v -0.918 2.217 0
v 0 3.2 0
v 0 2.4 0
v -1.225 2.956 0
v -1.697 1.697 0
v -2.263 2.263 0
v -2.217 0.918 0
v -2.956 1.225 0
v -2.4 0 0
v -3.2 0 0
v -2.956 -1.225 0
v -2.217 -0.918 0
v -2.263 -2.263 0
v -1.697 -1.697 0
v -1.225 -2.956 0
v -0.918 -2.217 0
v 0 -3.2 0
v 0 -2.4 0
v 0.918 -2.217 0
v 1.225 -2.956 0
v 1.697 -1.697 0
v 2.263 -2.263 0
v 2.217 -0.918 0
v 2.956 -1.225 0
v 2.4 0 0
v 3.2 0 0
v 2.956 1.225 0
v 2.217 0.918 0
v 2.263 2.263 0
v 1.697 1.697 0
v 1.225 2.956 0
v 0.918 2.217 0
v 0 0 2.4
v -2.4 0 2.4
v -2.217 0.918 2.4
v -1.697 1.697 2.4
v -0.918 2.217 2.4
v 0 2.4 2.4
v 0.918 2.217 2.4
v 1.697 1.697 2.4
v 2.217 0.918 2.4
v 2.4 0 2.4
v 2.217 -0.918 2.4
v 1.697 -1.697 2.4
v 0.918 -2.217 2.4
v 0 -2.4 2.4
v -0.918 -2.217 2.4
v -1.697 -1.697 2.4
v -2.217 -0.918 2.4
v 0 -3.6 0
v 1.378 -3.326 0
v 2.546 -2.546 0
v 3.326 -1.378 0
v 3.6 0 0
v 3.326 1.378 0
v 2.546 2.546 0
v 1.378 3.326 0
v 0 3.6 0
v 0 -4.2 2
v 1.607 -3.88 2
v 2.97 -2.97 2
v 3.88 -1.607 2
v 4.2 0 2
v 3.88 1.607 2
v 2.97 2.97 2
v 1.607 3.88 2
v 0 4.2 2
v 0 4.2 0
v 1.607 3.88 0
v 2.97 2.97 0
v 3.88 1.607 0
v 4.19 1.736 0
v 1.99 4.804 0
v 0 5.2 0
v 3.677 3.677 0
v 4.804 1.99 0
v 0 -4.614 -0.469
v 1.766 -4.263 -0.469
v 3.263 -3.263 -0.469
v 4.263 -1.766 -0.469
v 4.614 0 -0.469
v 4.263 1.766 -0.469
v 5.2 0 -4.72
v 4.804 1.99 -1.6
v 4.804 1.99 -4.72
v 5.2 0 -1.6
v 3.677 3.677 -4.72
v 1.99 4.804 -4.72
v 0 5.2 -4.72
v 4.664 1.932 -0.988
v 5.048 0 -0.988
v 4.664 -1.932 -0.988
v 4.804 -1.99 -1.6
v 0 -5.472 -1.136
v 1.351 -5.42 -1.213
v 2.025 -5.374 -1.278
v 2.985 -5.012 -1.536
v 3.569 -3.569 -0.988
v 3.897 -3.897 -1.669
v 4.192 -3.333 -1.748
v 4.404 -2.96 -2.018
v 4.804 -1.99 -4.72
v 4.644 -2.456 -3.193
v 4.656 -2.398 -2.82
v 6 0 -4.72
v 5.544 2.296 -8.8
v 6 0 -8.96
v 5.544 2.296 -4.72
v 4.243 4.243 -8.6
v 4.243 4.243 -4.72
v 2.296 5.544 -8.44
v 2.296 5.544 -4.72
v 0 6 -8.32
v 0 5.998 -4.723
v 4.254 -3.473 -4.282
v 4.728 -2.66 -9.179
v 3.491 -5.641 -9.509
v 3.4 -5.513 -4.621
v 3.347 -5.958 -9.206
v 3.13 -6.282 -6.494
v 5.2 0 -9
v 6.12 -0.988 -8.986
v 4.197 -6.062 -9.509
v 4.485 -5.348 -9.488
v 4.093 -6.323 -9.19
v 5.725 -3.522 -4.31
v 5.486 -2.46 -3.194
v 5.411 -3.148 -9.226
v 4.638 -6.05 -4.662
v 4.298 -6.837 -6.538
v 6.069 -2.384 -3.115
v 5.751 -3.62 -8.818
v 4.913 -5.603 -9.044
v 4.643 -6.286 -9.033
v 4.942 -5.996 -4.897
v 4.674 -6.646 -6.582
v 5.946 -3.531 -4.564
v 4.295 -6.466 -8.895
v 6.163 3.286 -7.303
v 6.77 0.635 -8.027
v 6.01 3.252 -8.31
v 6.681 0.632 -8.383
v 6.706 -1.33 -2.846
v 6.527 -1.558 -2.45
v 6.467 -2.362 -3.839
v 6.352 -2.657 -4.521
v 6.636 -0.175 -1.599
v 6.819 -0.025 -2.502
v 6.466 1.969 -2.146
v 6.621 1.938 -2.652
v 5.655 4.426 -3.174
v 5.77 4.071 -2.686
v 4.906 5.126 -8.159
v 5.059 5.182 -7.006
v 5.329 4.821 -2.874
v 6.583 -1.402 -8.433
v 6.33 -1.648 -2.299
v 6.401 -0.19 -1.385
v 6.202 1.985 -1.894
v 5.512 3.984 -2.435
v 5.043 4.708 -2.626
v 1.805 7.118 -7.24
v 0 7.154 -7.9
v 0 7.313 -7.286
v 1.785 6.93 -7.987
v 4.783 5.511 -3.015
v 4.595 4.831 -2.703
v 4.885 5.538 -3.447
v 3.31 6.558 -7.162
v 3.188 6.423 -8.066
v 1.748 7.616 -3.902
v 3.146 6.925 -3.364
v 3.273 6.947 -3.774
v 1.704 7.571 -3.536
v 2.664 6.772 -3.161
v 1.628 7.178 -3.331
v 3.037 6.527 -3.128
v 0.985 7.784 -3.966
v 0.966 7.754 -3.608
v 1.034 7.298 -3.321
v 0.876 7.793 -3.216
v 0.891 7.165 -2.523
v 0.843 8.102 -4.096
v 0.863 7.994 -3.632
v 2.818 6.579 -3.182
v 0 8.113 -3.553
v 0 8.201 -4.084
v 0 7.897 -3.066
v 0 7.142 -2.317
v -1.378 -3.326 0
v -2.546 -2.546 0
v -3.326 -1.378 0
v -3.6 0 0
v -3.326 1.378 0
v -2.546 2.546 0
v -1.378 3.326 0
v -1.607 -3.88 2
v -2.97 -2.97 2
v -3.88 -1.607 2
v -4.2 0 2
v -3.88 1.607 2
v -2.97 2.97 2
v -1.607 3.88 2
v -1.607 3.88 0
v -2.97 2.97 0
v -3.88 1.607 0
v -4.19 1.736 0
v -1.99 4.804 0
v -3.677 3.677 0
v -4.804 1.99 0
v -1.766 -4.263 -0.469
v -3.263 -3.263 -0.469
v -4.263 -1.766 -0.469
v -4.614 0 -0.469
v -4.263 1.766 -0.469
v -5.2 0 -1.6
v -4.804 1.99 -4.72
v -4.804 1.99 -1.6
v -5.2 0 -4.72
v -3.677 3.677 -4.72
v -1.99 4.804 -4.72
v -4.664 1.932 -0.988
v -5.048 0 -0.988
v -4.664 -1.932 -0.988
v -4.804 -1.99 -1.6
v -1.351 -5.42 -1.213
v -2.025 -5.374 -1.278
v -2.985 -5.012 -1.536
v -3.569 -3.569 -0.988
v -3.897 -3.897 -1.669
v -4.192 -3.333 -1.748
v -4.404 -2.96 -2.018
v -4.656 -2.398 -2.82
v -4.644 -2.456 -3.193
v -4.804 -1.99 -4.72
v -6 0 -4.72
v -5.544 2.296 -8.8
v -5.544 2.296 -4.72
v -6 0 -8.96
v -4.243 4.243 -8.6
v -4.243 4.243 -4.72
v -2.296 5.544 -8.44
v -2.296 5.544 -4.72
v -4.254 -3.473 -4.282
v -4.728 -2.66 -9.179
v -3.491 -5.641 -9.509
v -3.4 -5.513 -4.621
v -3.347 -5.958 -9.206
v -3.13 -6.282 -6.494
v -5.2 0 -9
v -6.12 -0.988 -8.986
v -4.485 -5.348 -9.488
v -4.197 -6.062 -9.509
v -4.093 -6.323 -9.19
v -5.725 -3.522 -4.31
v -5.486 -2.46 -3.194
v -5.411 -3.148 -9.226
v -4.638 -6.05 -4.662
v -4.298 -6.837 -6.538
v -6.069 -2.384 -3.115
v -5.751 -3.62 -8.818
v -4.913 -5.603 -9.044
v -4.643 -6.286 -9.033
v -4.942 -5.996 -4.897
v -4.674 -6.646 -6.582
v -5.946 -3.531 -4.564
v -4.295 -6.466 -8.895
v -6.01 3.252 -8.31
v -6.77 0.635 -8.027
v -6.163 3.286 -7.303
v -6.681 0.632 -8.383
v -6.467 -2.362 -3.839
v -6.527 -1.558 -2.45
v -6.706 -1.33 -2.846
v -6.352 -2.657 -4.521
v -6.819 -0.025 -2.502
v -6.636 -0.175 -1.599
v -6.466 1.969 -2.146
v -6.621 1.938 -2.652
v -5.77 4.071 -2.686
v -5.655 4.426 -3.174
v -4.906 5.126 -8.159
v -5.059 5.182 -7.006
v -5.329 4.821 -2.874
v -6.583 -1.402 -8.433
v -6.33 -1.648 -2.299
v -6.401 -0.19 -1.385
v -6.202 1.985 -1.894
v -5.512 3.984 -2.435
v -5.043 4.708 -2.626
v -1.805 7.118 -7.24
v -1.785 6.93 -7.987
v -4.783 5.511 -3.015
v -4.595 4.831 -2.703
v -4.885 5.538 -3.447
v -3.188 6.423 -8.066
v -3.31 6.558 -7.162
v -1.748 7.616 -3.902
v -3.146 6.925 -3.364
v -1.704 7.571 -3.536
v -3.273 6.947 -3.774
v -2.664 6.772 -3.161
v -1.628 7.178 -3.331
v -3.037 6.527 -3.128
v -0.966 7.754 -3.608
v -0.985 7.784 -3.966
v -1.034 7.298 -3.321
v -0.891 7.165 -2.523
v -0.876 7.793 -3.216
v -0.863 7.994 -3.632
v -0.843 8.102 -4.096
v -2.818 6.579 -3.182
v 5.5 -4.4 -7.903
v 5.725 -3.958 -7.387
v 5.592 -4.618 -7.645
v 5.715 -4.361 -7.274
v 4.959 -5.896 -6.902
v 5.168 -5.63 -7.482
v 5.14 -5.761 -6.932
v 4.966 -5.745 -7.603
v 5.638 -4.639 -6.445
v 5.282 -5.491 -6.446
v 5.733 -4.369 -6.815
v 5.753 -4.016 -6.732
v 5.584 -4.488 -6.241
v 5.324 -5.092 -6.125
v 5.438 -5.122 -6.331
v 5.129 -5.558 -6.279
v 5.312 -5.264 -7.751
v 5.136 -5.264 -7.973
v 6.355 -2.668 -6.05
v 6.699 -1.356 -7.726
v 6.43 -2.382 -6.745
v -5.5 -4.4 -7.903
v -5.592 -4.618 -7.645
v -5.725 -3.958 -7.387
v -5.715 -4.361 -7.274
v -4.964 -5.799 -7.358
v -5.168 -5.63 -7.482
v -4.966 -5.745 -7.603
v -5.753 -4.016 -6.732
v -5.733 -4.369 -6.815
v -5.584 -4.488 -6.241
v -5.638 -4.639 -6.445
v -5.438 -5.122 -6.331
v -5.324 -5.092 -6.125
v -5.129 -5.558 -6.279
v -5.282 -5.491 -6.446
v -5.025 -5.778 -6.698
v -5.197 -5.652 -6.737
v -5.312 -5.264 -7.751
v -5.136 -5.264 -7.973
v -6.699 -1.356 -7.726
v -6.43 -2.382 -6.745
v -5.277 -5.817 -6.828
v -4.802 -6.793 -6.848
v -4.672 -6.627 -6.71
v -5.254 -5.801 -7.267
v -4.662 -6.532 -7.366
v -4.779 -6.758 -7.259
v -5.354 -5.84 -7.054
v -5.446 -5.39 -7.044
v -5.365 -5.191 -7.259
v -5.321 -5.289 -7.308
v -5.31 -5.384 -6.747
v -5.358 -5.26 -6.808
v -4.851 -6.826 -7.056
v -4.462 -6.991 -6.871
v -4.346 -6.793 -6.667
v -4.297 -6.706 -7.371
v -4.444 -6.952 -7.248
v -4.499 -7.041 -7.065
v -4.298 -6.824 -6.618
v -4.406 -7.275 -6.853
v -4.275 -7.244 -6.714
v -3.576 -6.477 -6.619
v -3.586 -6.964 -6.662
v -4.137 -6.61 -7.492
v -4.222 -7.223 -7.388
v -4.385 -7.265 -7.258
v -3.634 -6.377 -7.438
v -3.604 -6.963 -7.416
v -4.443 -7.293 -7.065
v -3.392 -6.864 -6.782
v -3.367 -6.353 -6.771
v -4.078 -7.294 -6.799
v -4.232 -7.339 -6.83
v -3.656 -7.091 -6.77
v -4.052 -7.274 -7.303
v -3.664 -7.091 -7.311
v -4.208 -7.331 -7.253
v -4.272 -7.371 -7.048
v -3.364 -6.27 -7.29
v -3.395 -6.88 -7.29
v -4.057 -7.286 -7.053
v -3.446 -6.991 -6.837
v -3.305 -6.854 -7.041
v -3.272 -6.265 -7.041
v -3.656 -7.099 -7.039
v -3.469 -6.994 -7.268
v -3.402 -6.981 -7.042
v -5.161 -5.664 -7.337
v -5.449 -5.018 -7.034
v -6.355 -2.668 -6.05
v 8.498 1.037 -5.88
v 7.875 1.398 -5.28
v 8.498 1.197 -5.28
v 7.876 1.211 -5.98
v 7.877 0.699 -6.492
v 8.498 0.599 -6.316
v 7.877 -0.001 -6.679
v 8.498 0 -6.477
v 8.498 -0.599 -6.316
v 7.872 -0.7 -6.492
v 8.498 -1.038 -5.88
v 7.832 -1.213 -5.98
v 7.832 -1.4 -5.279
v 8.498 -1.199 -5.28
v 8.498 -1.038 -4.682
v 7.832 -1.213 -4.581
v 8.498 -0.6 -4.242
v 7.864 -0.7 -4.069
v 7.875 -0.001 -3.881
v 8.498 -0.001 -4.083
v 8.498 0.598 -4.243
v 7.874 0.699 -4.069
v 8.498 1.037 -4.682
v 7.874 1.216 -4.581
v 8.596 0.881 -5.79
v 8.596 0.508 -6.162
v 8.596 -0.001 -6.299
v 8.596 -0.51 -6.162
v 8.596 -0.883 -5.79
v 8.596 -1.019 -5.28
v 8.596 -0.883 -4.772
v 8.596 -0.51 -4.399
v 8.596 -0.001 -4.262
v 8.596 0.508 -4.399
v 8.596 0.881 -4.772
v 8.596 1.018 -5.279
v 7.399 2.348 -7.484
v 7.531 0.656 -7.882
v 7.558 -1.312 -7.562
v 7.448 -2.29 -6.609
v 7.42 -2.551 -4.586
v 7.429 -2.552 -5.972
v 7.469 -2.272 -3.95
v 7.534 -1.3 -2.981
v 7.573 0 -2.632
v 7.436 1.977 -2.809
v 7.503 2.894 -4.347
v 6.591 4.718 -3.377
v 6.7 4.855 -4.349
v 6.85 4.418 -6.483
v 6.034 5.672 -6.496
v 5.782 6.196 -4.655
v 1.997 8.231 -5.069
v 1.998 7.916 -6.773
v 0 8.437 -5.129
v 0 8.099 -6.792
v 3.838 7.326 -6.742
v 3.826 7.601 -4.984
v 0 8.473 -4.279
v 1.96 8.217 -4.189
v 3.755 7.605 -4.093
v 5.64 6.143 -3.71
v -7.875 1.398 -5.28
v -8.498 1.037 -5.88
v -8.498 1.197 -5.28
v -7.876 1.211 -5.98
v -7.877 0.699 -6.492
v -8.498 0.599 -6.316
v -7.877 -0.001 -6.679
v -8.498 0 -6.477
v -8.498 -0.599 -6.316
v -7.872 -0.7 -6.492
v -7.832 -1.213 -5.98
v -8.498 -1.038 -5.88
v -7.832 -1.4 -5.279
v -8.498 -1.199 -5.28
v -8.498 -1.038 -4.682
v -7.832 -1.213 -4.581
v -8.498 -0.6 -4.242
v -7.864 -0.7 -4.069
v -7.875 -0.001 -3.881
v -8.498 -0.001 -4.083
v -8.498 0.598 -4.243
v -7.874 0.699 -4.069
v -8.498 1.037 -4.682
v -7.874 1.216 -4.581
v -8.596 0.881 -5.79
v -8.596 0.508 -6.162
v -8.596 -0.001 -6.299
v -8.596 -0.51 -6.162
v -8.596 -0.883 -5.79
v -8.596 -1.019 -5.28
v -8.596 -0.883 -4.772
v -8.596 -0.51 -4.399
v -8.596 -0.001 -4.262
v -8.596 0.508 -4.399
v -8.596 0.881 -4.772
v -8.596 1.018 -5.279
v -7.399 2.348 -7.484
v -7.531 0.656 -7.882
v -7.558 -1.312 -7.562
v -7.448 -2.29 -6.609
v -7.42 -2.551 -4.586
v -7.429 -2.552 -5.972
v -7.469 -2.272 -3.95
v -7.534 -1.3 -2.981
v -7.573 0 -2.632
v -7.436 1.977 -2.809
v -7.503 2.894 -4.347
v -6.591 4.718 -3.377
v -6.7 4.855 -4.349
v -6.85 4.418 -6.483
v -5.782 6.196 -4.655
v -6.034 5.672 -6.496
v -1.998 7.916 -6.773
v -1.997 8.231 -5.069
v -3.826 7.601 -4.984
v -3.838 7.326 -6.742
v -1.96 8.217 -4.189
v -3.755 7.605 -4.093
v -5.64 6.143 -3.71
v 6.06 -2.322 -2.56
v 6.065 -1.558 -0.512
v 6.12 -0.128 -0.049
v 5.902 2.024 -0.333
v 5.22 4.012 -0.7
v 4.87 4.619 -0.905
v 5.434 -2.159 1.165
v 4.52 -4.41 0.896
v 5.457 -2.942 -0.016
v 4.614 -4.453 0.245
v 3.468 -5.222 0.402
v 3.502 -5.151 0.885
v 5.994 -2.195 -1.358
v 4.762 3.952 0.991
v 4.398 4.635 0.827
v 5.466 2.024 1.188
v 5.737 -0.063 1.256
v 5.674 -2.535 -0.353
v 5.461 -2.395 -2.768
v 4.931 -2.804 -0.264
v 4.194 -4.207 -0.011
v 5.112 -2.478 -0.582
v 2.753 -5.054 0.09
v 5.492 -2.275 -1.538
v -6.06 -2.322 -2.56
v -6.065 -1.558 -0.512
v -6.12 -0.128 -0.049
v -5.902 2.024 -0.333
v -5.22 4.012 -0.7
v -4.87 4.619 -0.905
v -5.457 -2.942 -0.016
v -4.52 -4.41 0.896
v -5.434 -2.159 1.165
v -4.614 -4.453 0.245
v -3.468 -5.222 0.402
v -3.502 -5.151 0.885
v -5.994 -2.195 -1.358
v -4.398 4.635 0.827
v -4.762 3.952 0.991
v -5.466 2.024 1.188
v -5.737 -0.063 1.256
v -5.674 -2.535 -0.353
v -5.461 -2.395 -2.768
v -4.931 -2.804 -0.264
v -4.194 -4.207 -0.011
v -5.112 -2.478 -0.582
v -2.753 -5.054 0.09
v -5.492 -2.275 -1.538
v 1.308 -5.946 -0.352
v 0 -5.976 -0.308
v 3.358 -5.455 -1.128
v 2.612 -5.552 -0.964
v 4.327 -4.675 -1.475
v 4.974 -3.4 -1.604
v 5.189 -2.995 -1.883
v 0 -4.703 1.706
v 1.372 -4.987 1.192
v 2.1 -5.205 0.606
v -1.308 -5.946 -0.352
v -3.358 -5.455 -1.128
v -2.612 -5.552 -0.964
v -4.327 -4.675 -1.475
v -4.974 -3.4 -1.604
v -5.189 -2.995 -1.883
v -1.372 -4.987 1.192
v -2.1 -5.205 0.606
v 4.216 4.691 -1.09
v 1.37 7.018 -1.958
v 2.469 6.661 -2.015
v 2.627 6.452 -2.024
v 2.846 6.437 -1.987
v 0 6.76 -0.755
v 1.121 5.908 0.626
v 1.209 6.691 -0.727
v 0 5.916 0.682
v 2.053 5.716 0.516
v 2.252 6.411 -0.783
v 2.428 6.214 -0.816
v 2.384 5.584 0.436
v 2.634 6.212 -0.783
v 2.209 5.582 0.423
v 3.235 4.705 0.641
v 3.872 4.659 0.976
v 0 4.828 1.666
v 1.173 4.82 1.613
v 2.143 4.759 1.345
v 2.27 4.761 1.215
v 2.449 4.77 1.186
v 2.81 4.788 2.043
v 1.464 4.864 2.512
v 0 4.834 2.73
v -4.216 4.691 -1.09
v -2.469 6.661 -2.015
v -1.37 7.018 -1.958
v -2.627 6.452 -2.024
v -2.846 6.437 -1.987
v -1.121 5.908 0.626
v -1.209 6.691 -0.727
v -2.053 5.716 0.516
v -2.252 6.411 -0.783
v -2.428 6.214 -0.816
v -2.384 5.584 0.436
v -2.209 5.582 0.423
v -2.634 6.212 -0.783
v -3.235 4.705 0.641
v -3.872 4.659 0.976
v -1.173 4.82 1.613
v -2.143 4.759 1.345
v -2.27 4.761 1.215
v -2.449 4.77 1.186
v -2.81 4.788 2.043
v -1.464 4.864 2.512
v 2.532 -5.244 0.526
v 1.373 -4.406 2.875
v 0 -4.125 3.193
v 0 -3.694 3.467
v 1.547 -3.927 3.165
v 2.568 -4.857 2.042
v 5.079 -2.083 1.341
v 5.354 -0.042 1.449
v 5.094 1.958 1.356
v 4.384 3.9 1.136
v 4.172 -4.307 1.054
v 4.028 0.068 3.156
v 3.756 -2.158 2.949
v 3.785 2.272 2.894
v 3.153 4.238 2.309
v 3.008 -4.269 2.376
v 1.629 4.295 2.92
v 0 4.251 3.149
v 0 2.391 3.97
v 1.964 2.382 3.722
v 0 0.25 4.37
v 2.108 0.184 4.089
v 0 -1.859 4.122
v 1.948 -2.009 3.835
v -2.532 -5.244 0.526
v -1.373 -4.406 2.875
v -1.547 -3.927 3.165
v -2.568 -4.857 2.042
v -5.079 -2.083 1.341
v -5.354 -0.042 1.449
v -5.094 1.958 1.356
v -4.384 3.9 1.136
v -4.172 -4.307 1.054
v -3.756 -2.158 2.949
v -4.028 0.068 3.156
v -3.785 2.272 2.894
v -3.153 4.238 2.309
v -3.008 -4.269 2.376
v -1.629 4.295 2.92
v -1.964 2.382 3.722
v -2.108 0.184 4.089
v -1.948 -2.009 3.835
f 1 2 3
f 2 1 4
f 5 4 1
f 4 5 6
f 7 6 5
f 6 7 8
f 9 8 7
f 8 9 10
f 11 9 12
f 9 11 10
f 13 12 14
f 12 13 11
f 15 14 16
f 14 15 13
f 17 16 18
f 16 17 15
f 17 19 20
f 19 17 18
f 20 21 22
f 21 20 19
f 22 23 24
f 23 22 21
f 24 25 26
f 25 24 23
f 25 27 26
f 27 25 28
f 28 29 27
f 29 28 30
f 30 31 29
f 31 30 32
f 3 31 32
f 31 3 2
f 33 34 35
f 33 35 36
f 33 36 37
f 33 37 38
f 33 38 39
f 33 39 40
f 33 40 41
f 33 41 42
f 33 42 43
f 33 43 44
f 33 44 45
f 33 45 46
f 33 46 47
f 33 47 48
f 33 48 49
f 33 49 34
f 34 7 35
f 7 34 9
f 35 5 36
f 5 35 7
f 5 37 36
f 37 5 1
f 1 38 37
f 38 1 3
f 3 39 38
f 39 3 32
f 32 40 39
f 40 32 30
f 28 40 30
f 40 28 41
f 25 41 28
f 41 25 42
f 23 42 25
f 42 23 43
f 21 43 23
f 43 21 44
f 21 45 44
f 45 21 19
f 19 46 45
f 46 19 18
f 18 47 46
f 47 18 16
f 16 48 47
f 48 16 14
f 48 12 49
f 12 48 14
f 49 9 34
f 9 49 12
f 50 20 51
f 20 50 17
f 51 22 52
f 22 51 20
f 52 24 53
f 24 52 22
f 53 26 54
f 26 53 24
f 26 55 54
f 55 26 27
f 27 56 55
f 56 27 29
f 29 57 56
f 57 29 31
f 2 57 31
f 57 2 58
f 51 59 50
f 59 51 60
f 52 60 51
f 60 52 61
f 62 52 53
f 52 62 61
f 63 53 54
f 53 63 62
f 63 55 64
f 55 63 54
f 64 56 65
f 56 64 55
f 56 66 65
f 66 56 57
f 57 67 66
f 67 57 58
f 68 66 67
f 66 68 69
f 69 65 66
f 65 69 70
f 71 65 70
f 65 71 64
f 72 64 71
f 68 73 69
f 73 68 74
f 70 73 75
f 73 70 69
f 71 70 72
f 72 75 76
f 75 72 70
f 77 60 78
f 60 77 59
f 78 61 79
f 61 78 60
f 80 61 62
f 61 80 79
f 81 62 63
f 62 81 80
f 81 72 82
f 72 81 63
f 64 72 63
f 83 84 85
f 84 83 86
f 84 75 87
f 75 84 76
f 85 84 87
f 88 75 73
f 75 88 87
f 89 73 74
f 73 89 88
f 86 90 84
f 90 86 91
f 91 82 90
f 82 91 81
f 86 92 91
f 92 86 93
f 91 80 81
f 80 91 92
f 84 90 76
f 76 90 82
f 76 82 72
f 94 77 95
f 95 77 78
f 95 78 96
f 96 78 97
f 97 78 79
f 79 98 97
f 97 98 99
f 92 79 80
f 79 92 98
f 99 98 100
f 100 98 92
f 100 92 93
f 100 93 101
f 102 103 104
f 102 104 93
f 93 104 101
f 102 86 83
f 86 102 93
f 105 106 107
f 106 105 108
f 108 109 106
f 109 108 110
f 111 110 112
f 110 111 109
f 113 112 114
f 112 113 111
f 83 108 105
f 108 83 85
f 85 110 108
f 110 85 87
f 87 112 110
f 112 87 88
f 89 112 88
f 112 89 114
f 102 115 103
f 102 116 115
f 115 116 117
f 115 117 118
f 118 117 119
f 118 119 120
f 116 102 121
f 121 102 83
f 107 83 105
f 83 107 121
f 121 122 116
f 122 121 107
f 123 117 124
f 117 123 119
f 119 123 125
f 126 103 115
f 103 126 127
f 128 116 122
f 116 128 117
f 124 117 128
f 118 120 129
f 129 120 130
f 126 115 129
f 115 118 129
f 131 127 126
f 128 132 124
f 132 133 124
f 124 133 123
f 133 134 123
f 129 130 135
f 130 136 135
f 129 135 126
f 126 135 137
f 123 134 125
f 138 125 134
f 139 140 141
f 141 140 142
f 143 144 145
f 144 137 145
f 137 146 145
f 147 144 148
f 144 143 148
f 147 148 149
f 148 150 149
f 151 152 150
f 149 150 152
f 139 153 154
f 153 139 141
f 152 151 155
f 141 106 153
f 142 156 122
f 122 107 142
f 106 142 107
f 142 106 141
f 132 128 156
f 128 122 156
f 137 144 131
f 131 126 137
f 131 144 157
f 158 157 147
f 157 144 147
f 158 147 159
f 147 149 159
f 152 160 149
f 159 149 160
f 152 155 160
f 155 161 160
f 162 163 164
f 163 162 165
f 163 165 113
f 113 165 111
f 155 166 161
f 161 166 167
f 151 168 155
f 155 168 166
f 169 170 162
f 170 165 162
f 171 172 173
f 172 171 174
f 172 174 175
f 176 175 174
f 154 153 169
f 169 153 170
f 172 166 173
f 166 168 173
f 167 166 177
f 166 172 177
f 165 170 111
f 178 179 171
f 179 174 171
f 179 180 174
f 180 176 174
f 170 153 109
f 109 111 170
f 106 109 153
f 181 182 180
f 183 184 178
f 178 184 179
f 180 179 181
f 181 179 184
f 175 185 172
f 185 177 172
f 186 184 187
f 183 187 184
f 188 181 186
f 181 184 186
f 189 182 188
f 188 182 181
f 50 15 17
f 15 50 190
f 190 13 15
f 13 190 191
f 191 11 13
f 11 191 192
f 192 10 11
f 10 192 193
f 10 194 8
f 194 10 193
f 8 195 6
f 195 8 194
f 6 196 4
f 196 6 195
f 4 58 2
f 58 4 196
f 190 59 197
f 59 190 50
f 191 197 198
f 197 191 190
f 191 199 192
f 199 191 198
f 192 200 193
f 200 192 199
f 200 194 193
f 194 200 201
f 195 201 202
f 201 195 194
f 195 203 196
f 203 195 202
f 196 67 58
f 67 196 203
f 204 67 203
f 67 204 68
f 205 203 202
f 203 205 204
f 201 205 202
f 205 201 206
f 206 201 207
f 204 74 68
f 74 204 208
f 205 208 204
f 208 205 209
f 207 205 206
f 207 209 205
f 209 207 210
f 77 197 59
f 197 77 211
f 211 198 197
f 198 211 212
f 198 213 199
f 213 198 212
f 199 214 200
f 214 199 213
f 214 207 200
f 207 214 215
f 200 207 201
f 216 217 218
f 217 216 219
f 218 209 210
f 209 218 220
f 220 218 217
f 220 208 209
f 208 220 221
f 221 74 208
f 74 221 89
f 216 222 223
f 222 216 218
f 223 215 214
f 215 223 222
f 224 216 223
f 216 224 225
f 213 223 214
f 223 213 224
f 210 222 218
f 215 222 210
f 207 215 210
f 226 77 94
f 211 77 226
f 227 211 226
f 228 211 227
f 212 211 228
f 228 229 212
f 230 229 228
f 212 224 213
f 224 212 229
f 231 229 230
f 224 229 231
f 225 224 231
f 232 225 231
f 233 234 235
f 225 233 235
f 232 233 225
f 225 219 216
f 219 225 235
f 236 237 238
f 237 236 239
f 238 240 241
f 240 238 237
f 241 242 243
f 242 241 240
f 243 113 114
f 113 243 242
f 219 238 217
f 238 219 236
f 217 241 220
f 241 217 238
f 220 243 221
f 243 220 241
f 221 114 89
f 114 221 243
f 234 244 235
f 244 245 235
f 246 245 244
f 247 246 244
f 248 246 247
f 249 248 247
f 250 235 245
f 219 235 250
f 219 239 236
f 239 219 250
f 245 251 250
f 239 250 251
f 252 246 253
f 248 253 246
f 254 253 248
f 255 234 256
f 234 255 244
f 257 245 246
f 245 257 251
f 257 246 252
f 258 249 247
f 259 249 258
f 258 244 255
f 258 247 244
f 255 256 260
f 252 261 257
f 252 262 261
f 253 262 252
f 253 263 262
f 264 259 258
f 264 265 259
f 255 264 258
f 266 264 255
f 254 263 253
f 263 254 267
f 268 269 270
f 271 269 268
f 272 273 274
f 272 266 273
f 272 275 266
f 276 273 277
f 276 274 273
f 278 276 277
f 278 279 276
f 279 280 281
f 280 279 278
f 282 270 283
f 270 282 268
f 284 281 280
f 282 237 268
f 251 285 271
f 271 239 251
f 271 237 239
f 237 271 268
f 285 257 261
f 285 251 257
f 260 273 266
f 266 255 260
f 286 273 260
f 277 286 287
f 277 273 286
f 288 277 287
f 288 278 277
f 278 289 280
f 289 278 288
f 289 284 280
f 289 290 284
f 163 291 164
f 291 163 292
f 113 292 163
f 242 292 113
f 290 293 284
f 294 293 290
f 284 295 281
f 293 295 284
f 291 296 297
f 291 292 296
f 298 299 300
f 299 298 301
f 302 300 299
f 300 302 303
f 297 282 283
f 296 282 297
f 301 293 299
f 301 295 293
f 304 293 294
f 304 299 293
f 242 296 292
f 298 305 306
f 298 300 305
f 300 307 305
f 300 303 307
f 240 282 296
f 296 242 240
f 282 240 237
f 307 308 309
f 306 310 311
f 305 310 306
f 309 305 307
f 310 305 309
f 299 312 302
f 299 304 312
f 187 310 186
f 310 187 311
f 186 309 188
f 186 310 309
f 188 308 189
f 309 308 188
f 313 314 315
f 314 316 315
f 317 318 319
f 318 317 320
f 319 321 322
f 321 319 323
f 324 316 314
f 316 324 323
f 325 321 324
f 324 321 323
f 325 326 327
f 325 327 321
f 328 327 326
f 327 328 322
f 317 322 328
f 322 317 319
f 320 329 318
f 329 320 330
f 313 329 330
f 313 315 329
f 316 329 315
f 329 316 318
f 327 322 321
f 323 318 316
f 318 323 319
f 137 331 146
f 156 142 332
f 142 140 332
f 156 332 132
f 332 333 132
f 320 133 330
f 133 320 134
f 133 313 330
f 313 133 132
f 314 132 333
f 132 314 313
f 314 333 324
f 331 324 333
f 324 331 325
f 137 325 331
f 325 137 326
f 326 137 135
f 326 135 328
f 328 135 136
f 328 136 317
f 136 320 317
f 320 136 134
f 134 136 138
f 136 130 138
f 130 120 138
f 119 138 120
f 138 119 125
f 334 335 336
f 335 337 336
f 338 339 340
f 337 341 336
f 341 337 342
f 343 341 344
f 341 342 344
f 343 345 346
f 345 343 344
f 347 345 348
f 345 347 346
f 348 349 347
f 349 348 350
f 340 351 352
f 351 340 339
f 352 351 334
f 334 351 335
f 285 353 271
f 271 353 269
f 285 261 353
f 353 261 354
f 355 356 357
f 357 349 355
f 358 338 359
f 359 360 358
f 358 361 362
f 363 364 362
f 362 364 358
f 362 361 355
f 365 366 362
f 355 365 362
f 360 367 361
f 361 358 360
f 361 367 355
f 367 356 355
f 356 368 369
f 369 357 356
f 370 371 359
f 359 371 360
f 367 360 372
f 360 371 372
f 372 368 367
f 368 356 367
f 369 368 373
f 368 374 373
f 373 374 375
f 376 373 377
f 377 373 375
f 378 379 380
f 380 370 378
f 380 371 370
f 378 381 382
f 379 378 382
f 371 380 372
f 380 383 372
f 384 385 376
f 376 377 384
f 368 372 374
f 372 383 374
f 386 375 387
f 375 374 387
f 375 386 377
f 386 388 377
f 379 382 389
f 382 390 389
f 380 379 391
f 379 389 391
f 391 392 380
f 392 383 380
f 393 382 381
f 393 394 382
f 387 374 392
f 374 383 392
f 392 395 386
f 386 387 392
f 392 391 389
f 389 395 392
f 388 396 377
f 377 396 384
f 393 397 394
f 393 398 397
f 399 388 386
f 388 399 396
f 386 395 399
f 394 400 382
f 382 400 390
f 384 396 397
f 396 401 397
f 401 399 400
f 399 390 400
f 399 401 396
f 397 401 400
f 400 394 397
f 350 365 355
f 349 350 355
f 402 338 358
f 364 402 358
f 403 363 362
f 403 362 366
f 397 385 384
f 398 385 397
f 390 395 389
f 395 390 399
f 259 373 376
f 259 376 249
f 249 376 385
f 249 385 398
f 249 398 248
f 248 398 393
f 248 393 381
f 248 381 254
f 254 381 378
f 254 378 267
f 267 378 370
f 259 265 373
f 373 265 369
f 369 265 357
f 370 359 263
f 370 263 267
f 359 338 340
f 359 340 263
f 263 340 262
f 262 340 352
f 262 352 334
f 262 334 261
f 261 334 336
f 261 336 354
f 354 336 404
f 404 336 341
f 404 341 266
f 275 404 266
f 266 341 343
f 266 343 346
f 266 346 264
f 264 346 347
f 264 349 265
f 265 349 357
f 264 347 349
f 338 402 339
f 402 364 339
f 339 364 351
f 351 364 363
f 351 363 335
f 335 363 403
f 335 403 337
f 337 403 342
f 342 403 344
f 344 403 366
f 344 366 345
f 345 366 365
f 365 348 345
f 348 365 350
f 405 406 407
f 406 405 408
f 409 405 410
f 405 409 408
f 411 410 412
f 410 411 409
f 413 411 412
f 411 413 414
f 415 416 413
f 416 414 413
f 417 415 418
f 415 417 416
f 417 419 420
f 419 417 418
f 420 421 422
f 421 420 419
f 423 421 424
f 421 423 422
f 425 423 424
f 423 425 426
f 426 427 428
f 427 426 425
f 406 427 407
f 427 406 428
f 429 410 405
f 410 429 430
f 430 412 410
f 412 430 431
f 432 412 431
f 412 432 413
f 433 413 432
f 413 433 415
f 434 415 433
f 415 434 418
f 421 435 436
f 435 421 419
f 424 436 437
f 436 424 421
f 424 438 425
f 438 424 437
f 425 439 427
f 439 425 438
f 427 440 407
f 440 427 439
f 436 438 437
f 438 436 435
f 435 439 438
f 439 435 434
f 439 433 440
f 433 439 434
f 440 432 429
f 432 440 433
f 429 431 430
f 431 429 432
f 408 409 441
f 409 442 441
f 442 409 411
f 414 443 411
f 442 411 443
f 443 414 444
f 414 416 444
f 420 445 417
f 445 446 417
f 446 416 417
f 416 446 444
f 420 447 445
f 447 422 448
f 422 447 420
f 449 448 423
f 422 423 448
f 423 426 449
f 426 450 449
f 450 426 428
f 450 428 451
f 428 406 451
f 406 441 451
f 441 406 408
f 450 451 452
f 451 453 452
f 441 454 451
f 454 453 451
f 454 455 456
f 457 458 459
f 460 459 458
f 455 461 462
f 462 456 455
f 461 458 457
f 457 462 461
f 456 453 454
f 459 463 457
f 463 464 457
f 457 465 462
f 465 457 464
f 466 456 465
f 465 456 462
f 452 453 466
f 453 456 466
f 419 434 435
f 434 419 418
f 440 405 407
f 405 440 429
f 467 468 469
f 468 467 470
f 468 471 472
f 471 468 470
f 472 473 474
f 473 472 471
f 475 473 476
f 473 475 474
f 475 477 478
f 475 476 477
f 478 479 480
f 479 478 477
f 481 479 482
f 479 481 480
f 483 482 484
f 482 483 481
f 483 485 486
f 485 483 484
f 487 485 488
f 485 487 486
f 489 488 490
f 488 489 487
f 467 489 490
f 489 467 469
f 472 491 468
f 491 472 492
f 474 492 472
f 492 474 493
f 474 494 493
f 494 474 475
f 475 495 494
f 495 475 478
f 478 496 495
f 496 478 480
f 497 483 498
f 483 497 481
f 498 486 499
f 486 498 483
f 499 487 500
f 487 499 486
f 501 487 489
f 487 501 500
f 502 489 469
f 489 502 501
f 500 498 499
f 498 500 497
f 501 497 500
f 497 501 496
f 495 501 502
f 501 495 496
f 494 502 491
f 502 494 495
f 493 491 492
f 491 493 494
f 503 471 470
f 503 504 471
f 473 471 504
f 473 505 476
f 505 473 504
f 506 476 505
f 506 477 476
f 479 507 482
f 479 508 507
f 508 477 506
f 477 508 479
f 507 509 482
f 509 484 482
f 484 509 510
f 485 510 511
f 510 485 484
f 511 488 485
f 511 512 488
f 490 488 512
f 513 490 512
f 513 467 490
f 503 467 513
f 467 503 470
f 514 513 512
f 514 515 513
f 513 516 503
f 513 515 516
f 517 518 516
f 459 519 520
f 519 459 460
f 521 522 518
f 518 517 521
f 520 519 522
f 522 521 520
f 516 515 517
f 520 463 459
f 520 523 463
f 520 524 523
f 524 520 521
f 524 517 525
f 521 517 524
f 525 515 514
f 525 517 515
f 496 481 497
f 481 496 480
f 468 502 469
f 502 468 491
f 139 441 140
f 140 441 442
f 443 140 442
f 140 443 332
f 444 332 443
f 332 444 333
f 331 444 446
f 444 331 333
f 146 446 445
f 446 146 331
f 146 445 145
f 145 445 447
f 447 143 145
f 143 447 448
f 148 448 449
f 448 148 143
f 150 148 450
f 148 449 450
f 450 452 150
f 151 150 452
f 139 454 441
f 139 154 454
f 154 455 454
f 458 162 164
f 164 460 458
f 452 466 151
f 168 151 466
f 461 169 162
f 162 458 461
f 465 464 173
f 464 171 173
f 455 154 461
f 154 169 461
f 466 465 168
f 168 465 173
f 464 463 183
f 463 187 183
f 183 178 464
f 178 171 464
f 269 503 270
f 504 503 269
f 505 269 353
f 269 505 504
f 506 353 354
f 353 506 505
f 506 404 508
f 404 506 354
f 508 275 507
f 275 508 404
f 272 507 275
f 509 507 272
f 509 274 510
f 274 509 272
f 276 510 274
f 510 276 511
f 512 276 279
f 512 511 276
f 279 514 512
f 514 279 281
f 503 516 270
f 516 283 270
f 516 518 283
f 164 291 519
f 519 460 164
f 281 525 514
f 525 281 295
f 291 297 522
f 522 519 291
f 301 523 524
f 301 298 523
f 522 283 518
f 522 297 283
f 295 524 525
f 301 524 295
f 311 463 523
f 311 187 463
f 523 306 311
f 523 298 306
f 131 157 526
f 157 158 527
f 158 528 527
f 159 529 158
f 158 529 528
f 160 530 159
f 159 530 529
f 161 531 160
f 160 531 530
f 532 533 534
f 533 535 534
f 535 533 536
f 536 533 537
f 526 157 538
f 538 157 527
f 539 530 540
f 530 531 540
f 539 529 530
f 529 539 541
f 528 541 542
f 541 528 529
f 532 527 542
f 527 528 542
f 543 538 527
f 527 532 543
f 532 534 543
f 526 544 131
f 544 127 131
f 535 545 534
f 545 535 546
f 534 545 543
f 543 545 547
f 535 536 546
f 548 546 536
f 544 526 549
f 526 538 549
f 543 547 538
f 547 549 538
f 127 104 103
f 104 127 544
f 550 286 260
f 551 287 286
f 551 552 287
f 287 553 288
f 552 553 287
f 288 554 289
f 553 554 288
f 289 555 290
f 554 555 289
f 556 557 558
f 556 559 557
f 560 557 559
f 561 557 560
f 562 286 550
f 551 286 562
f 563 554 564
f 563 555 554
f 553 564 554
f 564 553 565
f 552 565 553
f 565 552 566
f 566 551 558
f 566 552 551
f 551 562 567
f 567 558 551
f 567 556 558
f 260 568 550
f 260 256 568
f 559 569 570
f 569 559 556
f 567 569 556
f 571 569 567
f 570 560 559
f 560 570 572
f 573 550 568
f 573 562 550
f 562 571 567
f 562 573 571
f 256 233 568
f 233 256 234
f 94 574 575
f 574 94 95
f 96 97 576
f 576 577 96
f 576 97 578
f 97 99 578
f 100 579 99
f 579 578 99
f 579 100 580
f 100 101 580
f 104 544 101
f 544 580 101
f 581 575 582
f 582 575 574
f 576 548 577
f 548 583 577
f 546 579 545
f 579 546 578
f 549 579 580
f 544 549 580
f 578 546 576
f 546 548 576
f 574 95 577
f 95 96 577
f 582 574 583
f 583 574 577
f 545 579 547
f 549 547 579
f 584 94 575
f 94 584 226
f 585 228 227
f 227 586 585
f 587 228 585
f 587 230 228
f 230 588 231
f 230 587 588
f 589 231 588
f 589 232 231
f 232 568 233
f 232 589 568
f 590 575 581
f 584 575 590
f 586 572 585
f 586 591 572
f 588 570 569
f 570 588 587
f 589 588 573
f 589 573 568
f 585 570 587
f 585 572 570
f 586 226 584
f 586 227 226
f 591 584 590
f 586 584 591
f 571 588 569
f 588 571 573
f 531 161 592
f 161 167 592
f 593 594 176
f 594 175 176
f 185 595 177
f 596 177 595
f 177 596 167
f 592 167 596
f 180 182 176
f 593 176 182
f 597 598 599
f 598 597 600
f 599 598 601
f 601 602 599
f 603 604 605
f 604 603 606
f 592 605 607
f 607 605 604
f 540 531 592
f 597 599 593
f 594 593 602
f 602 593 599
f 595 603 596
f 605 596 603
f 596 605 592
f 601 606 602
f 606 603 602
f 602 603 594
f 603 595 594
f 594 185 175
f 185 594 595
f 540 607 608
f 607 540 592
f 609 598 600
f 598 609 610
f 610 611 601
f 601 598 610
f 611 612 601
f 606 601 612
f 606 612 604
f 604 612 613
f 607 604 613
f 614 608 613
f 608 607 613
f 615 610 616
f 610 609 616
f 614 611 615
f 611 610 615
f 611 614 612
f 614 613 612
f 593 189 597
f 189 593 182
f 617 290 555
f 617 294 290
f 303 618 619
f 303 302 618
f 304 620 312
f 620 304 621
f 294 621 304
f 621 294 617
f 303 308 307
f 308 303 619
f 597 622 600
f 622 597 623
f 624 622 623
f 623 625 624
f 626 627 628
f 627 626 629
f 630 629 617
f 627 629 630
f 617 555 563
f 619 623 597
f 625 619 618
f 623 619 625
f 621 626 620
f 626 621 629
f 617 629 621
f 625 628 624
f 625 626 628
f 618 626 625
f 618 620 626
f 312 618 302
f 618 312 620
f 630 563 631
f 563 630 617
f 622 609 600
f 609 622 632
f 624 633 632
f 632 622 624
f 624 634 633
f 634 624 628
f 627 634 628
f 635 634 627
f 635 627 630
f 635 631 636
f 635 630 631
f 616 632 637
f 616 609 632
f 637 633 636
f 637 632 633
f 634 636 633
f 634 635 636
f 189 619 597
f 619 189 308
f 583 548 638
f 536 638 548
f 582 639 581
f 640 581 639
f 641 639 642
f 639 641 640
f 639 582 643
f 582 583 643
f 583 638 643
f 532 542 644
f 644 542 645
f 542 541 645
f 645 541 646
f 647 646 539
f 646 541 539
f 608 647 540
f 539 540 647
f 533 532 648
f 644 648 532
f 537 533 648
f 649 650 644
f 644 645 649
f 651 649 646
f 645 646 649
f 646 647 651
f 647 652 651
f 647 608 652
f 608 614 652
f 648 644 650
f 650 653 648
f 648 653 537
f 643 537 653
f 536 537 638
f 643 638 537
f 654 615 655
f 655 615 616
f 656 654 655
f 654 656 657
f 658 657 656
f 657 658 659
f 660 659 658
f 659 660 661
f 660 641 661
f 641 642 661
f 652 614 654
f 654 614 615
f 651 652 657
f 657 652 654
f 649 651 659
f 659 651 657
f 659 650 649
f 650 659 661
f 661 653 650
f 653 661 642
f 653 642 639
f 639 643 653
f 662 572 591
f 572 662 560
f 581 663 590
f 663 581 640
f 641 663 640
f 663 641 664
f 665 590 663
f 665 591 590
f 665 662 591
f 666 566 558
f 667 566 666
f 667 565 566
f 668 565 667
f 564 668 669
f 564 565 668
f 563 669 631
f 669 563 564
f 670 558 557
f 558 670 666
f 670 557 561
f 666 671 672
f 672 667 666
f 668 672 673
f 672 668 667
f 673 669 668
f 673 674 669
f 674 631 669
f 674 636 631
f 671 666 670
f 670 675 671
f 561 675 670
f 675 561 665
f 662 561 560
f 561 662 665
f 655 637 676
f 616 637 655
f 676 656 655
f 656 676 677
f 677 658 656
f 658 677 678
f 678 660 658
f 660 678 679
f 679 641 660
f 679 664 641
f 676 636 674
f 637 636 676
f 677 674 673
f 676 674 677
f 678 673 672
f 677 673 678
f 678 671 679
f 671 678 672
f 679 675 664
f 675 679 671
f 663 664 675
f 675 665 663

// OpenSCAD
use <../lib.scad>
use <s/11538s01.scad>
use <s/11538s02.scad>
use <s/11538s03.scad>
use <s/11538s04.scad>
use <s/11538s05.scad>
use <s/11538s06.scad>
use <s/11538s07.scad>
use <s/11538s08.scad>
use <s/11538s09.scad>
use <../p/stud4o.scad>
function ldraw_lib__11538() = [
// 0 Minifig Helmet with Cheek Protectors and Communicator
// 0 Name: 11538.dat
// 0 Author: Lisa Winter [LisaWinter]
// 0 !LDRAW_ORG Part UPDATE 2026-02
// 0 !LICENSE Licensed under CC BY 4.0 : see CAreadme.txt
// 
// 0 BFC CERTIFY CCW
  [0,"BFC","CERTIFY"],
  [0,"BFC","CCW"],
// 
// 0 !CATEGORY Minifig Headwear
// 
// 0 !KEYWORDS A-wing, Rebel, Star Wars, SW
// 
// 0 !HISTORY 2026-03-06 [OrionP] Official Update 2026-02
// 
// 1 16 0 -6 0 1 0 0 0 -1.5 0 0 0 1 stud4o.dat
  [1,16,0,-6,0,1,0,0,0,-1.5,0,0,0,1, ldraw_lib__stud4o()],
// 
// 1 16 0 0 0 1 0 0 0 1 0 0 0 1 s\11538s01.dat
  [1,16,0,0,0,1,0,0,0,1,0,0,0,1, ldraw_lib__s__11538s01()],
// 1 16 0 0 0 -1 0 0 0 1 0 0 0 1 s\11538s01.dat
  [1,16,0,0,0,-1,0,0,0,1,0,0,0,1, ldraw_lib__s__11538s01()],
// 1 16 0 0 0 1 0 0 0 1 0 0 0 1 s\11538s02.dat
  [1,16,0,0,0,1,0,0,0,1,0,0,0,1, ldraw_lib__s__11538s02()],
// 1 16 0 0 0 1 0 0 0 1 0 0 0 1 s\11538s03.dat
  [1,16,0,0,0,1,0,0,0,1,0,0,0,1, ldraw_lib__s__11538s03()],
// 1 16 0 0 0 1 0 0 0 1 0 0 0 1 s\11538s04.dat
  [1,16,0,0,0,1,0,0,0,1,0,0,0,1, ldraw_lib__s__11538s04()],
// 1 16 0 0 0 -1 0 0 0 1 0 0 0 1 s\11538s04.dat
  [1,16,0,0,0,-1,0,0,0,1,0,0,0,1, ldraw_lib__s__11538s04()],
// 1 16 0 0 0 1 0 0 0 1 0 0 0 1 s\11538s05.dat
  [1,16,0,0,0,1,0,0,0,1,0,0,0,1, ldraw_lib__s__11538s05()],
// 1 16 0 0 0 -1 0 0 0 1 0 0 0 1 s\11538s05.dat
  [1,16,0,0,0,-1,0,0,0,1,0,0,0,1, ldraw_lib__s__11538s05()],
// 1 16 0 0 0 1 0 0 0 1 0 0 0 1 s\11538s06.dat
  [1,16,0,0,0,1,0,0,0,1,0,0,0,1, ldraw_lib__s__11538s06()],
// 1 16 0 0 0 -1 0 0 0 1 0 0 0 1 s\11538s06.dat
  [1,16,0,0,0,-1,0,0,0,1,0,0,0,1, ldraw_lib__s__11538s06()],
// 1 16 0 0 0 1 0 0 0 1 0 0 0 1 s\11538s07.dat
  [1,16,0,0,0,1,0,0,0,1,0,0,0,1, ldraw_lib__s__11538s07()],
// 1 16 0 0 0 -1 0 0 0 1 0 0 0 1 s\11538s07.dat
  [1,16,0,0,0,-1,0,0,0,1,0,0,0,1, ldraw_lib__s__11538s07()],
// 1 16 0 0 0 1 0 0 0 1 0 0 0 1 s\11538s08.dat
  [1,16,0,0,0,1,0,0,0,1,0,0,0,1, ldraw_lib__s__11538s08()],
// 1 16 0 0 0 -1 0 0 0 1 0 0 0 1 s\11538s08.dat
  [1,16,0,0,0,-1,0,0,0,1,0,0,0,1, ldraw_lib__s__11538s08()],
// 1 16 0 0 0 1 0 0 0 1 0 0 0 1 s\11538s09.dat
  [1,16,0,0,0,1,0,0,0,1,0,0,0,1, ldraw_lib__s__11538s09()],
// 1 16 0 0 0 -1 0 0 0 1 0 0 0 1 s\11538s09.dat
  [1,16,0,0,0,-1,0,0,0,1,0,0,0,1, ldraw_lib__s__11538s09()],
];
module ldraw_lib__11538(step=0, col=false, unit=2/5, alt=false, line=0.2, solid=!$preview)
    makepoly(ldraw_lib__11538(), step=step, col=col, unit=unit, alt=alt, line=line, solid=solid);
ldraw_lib__11538(line=0.2);
